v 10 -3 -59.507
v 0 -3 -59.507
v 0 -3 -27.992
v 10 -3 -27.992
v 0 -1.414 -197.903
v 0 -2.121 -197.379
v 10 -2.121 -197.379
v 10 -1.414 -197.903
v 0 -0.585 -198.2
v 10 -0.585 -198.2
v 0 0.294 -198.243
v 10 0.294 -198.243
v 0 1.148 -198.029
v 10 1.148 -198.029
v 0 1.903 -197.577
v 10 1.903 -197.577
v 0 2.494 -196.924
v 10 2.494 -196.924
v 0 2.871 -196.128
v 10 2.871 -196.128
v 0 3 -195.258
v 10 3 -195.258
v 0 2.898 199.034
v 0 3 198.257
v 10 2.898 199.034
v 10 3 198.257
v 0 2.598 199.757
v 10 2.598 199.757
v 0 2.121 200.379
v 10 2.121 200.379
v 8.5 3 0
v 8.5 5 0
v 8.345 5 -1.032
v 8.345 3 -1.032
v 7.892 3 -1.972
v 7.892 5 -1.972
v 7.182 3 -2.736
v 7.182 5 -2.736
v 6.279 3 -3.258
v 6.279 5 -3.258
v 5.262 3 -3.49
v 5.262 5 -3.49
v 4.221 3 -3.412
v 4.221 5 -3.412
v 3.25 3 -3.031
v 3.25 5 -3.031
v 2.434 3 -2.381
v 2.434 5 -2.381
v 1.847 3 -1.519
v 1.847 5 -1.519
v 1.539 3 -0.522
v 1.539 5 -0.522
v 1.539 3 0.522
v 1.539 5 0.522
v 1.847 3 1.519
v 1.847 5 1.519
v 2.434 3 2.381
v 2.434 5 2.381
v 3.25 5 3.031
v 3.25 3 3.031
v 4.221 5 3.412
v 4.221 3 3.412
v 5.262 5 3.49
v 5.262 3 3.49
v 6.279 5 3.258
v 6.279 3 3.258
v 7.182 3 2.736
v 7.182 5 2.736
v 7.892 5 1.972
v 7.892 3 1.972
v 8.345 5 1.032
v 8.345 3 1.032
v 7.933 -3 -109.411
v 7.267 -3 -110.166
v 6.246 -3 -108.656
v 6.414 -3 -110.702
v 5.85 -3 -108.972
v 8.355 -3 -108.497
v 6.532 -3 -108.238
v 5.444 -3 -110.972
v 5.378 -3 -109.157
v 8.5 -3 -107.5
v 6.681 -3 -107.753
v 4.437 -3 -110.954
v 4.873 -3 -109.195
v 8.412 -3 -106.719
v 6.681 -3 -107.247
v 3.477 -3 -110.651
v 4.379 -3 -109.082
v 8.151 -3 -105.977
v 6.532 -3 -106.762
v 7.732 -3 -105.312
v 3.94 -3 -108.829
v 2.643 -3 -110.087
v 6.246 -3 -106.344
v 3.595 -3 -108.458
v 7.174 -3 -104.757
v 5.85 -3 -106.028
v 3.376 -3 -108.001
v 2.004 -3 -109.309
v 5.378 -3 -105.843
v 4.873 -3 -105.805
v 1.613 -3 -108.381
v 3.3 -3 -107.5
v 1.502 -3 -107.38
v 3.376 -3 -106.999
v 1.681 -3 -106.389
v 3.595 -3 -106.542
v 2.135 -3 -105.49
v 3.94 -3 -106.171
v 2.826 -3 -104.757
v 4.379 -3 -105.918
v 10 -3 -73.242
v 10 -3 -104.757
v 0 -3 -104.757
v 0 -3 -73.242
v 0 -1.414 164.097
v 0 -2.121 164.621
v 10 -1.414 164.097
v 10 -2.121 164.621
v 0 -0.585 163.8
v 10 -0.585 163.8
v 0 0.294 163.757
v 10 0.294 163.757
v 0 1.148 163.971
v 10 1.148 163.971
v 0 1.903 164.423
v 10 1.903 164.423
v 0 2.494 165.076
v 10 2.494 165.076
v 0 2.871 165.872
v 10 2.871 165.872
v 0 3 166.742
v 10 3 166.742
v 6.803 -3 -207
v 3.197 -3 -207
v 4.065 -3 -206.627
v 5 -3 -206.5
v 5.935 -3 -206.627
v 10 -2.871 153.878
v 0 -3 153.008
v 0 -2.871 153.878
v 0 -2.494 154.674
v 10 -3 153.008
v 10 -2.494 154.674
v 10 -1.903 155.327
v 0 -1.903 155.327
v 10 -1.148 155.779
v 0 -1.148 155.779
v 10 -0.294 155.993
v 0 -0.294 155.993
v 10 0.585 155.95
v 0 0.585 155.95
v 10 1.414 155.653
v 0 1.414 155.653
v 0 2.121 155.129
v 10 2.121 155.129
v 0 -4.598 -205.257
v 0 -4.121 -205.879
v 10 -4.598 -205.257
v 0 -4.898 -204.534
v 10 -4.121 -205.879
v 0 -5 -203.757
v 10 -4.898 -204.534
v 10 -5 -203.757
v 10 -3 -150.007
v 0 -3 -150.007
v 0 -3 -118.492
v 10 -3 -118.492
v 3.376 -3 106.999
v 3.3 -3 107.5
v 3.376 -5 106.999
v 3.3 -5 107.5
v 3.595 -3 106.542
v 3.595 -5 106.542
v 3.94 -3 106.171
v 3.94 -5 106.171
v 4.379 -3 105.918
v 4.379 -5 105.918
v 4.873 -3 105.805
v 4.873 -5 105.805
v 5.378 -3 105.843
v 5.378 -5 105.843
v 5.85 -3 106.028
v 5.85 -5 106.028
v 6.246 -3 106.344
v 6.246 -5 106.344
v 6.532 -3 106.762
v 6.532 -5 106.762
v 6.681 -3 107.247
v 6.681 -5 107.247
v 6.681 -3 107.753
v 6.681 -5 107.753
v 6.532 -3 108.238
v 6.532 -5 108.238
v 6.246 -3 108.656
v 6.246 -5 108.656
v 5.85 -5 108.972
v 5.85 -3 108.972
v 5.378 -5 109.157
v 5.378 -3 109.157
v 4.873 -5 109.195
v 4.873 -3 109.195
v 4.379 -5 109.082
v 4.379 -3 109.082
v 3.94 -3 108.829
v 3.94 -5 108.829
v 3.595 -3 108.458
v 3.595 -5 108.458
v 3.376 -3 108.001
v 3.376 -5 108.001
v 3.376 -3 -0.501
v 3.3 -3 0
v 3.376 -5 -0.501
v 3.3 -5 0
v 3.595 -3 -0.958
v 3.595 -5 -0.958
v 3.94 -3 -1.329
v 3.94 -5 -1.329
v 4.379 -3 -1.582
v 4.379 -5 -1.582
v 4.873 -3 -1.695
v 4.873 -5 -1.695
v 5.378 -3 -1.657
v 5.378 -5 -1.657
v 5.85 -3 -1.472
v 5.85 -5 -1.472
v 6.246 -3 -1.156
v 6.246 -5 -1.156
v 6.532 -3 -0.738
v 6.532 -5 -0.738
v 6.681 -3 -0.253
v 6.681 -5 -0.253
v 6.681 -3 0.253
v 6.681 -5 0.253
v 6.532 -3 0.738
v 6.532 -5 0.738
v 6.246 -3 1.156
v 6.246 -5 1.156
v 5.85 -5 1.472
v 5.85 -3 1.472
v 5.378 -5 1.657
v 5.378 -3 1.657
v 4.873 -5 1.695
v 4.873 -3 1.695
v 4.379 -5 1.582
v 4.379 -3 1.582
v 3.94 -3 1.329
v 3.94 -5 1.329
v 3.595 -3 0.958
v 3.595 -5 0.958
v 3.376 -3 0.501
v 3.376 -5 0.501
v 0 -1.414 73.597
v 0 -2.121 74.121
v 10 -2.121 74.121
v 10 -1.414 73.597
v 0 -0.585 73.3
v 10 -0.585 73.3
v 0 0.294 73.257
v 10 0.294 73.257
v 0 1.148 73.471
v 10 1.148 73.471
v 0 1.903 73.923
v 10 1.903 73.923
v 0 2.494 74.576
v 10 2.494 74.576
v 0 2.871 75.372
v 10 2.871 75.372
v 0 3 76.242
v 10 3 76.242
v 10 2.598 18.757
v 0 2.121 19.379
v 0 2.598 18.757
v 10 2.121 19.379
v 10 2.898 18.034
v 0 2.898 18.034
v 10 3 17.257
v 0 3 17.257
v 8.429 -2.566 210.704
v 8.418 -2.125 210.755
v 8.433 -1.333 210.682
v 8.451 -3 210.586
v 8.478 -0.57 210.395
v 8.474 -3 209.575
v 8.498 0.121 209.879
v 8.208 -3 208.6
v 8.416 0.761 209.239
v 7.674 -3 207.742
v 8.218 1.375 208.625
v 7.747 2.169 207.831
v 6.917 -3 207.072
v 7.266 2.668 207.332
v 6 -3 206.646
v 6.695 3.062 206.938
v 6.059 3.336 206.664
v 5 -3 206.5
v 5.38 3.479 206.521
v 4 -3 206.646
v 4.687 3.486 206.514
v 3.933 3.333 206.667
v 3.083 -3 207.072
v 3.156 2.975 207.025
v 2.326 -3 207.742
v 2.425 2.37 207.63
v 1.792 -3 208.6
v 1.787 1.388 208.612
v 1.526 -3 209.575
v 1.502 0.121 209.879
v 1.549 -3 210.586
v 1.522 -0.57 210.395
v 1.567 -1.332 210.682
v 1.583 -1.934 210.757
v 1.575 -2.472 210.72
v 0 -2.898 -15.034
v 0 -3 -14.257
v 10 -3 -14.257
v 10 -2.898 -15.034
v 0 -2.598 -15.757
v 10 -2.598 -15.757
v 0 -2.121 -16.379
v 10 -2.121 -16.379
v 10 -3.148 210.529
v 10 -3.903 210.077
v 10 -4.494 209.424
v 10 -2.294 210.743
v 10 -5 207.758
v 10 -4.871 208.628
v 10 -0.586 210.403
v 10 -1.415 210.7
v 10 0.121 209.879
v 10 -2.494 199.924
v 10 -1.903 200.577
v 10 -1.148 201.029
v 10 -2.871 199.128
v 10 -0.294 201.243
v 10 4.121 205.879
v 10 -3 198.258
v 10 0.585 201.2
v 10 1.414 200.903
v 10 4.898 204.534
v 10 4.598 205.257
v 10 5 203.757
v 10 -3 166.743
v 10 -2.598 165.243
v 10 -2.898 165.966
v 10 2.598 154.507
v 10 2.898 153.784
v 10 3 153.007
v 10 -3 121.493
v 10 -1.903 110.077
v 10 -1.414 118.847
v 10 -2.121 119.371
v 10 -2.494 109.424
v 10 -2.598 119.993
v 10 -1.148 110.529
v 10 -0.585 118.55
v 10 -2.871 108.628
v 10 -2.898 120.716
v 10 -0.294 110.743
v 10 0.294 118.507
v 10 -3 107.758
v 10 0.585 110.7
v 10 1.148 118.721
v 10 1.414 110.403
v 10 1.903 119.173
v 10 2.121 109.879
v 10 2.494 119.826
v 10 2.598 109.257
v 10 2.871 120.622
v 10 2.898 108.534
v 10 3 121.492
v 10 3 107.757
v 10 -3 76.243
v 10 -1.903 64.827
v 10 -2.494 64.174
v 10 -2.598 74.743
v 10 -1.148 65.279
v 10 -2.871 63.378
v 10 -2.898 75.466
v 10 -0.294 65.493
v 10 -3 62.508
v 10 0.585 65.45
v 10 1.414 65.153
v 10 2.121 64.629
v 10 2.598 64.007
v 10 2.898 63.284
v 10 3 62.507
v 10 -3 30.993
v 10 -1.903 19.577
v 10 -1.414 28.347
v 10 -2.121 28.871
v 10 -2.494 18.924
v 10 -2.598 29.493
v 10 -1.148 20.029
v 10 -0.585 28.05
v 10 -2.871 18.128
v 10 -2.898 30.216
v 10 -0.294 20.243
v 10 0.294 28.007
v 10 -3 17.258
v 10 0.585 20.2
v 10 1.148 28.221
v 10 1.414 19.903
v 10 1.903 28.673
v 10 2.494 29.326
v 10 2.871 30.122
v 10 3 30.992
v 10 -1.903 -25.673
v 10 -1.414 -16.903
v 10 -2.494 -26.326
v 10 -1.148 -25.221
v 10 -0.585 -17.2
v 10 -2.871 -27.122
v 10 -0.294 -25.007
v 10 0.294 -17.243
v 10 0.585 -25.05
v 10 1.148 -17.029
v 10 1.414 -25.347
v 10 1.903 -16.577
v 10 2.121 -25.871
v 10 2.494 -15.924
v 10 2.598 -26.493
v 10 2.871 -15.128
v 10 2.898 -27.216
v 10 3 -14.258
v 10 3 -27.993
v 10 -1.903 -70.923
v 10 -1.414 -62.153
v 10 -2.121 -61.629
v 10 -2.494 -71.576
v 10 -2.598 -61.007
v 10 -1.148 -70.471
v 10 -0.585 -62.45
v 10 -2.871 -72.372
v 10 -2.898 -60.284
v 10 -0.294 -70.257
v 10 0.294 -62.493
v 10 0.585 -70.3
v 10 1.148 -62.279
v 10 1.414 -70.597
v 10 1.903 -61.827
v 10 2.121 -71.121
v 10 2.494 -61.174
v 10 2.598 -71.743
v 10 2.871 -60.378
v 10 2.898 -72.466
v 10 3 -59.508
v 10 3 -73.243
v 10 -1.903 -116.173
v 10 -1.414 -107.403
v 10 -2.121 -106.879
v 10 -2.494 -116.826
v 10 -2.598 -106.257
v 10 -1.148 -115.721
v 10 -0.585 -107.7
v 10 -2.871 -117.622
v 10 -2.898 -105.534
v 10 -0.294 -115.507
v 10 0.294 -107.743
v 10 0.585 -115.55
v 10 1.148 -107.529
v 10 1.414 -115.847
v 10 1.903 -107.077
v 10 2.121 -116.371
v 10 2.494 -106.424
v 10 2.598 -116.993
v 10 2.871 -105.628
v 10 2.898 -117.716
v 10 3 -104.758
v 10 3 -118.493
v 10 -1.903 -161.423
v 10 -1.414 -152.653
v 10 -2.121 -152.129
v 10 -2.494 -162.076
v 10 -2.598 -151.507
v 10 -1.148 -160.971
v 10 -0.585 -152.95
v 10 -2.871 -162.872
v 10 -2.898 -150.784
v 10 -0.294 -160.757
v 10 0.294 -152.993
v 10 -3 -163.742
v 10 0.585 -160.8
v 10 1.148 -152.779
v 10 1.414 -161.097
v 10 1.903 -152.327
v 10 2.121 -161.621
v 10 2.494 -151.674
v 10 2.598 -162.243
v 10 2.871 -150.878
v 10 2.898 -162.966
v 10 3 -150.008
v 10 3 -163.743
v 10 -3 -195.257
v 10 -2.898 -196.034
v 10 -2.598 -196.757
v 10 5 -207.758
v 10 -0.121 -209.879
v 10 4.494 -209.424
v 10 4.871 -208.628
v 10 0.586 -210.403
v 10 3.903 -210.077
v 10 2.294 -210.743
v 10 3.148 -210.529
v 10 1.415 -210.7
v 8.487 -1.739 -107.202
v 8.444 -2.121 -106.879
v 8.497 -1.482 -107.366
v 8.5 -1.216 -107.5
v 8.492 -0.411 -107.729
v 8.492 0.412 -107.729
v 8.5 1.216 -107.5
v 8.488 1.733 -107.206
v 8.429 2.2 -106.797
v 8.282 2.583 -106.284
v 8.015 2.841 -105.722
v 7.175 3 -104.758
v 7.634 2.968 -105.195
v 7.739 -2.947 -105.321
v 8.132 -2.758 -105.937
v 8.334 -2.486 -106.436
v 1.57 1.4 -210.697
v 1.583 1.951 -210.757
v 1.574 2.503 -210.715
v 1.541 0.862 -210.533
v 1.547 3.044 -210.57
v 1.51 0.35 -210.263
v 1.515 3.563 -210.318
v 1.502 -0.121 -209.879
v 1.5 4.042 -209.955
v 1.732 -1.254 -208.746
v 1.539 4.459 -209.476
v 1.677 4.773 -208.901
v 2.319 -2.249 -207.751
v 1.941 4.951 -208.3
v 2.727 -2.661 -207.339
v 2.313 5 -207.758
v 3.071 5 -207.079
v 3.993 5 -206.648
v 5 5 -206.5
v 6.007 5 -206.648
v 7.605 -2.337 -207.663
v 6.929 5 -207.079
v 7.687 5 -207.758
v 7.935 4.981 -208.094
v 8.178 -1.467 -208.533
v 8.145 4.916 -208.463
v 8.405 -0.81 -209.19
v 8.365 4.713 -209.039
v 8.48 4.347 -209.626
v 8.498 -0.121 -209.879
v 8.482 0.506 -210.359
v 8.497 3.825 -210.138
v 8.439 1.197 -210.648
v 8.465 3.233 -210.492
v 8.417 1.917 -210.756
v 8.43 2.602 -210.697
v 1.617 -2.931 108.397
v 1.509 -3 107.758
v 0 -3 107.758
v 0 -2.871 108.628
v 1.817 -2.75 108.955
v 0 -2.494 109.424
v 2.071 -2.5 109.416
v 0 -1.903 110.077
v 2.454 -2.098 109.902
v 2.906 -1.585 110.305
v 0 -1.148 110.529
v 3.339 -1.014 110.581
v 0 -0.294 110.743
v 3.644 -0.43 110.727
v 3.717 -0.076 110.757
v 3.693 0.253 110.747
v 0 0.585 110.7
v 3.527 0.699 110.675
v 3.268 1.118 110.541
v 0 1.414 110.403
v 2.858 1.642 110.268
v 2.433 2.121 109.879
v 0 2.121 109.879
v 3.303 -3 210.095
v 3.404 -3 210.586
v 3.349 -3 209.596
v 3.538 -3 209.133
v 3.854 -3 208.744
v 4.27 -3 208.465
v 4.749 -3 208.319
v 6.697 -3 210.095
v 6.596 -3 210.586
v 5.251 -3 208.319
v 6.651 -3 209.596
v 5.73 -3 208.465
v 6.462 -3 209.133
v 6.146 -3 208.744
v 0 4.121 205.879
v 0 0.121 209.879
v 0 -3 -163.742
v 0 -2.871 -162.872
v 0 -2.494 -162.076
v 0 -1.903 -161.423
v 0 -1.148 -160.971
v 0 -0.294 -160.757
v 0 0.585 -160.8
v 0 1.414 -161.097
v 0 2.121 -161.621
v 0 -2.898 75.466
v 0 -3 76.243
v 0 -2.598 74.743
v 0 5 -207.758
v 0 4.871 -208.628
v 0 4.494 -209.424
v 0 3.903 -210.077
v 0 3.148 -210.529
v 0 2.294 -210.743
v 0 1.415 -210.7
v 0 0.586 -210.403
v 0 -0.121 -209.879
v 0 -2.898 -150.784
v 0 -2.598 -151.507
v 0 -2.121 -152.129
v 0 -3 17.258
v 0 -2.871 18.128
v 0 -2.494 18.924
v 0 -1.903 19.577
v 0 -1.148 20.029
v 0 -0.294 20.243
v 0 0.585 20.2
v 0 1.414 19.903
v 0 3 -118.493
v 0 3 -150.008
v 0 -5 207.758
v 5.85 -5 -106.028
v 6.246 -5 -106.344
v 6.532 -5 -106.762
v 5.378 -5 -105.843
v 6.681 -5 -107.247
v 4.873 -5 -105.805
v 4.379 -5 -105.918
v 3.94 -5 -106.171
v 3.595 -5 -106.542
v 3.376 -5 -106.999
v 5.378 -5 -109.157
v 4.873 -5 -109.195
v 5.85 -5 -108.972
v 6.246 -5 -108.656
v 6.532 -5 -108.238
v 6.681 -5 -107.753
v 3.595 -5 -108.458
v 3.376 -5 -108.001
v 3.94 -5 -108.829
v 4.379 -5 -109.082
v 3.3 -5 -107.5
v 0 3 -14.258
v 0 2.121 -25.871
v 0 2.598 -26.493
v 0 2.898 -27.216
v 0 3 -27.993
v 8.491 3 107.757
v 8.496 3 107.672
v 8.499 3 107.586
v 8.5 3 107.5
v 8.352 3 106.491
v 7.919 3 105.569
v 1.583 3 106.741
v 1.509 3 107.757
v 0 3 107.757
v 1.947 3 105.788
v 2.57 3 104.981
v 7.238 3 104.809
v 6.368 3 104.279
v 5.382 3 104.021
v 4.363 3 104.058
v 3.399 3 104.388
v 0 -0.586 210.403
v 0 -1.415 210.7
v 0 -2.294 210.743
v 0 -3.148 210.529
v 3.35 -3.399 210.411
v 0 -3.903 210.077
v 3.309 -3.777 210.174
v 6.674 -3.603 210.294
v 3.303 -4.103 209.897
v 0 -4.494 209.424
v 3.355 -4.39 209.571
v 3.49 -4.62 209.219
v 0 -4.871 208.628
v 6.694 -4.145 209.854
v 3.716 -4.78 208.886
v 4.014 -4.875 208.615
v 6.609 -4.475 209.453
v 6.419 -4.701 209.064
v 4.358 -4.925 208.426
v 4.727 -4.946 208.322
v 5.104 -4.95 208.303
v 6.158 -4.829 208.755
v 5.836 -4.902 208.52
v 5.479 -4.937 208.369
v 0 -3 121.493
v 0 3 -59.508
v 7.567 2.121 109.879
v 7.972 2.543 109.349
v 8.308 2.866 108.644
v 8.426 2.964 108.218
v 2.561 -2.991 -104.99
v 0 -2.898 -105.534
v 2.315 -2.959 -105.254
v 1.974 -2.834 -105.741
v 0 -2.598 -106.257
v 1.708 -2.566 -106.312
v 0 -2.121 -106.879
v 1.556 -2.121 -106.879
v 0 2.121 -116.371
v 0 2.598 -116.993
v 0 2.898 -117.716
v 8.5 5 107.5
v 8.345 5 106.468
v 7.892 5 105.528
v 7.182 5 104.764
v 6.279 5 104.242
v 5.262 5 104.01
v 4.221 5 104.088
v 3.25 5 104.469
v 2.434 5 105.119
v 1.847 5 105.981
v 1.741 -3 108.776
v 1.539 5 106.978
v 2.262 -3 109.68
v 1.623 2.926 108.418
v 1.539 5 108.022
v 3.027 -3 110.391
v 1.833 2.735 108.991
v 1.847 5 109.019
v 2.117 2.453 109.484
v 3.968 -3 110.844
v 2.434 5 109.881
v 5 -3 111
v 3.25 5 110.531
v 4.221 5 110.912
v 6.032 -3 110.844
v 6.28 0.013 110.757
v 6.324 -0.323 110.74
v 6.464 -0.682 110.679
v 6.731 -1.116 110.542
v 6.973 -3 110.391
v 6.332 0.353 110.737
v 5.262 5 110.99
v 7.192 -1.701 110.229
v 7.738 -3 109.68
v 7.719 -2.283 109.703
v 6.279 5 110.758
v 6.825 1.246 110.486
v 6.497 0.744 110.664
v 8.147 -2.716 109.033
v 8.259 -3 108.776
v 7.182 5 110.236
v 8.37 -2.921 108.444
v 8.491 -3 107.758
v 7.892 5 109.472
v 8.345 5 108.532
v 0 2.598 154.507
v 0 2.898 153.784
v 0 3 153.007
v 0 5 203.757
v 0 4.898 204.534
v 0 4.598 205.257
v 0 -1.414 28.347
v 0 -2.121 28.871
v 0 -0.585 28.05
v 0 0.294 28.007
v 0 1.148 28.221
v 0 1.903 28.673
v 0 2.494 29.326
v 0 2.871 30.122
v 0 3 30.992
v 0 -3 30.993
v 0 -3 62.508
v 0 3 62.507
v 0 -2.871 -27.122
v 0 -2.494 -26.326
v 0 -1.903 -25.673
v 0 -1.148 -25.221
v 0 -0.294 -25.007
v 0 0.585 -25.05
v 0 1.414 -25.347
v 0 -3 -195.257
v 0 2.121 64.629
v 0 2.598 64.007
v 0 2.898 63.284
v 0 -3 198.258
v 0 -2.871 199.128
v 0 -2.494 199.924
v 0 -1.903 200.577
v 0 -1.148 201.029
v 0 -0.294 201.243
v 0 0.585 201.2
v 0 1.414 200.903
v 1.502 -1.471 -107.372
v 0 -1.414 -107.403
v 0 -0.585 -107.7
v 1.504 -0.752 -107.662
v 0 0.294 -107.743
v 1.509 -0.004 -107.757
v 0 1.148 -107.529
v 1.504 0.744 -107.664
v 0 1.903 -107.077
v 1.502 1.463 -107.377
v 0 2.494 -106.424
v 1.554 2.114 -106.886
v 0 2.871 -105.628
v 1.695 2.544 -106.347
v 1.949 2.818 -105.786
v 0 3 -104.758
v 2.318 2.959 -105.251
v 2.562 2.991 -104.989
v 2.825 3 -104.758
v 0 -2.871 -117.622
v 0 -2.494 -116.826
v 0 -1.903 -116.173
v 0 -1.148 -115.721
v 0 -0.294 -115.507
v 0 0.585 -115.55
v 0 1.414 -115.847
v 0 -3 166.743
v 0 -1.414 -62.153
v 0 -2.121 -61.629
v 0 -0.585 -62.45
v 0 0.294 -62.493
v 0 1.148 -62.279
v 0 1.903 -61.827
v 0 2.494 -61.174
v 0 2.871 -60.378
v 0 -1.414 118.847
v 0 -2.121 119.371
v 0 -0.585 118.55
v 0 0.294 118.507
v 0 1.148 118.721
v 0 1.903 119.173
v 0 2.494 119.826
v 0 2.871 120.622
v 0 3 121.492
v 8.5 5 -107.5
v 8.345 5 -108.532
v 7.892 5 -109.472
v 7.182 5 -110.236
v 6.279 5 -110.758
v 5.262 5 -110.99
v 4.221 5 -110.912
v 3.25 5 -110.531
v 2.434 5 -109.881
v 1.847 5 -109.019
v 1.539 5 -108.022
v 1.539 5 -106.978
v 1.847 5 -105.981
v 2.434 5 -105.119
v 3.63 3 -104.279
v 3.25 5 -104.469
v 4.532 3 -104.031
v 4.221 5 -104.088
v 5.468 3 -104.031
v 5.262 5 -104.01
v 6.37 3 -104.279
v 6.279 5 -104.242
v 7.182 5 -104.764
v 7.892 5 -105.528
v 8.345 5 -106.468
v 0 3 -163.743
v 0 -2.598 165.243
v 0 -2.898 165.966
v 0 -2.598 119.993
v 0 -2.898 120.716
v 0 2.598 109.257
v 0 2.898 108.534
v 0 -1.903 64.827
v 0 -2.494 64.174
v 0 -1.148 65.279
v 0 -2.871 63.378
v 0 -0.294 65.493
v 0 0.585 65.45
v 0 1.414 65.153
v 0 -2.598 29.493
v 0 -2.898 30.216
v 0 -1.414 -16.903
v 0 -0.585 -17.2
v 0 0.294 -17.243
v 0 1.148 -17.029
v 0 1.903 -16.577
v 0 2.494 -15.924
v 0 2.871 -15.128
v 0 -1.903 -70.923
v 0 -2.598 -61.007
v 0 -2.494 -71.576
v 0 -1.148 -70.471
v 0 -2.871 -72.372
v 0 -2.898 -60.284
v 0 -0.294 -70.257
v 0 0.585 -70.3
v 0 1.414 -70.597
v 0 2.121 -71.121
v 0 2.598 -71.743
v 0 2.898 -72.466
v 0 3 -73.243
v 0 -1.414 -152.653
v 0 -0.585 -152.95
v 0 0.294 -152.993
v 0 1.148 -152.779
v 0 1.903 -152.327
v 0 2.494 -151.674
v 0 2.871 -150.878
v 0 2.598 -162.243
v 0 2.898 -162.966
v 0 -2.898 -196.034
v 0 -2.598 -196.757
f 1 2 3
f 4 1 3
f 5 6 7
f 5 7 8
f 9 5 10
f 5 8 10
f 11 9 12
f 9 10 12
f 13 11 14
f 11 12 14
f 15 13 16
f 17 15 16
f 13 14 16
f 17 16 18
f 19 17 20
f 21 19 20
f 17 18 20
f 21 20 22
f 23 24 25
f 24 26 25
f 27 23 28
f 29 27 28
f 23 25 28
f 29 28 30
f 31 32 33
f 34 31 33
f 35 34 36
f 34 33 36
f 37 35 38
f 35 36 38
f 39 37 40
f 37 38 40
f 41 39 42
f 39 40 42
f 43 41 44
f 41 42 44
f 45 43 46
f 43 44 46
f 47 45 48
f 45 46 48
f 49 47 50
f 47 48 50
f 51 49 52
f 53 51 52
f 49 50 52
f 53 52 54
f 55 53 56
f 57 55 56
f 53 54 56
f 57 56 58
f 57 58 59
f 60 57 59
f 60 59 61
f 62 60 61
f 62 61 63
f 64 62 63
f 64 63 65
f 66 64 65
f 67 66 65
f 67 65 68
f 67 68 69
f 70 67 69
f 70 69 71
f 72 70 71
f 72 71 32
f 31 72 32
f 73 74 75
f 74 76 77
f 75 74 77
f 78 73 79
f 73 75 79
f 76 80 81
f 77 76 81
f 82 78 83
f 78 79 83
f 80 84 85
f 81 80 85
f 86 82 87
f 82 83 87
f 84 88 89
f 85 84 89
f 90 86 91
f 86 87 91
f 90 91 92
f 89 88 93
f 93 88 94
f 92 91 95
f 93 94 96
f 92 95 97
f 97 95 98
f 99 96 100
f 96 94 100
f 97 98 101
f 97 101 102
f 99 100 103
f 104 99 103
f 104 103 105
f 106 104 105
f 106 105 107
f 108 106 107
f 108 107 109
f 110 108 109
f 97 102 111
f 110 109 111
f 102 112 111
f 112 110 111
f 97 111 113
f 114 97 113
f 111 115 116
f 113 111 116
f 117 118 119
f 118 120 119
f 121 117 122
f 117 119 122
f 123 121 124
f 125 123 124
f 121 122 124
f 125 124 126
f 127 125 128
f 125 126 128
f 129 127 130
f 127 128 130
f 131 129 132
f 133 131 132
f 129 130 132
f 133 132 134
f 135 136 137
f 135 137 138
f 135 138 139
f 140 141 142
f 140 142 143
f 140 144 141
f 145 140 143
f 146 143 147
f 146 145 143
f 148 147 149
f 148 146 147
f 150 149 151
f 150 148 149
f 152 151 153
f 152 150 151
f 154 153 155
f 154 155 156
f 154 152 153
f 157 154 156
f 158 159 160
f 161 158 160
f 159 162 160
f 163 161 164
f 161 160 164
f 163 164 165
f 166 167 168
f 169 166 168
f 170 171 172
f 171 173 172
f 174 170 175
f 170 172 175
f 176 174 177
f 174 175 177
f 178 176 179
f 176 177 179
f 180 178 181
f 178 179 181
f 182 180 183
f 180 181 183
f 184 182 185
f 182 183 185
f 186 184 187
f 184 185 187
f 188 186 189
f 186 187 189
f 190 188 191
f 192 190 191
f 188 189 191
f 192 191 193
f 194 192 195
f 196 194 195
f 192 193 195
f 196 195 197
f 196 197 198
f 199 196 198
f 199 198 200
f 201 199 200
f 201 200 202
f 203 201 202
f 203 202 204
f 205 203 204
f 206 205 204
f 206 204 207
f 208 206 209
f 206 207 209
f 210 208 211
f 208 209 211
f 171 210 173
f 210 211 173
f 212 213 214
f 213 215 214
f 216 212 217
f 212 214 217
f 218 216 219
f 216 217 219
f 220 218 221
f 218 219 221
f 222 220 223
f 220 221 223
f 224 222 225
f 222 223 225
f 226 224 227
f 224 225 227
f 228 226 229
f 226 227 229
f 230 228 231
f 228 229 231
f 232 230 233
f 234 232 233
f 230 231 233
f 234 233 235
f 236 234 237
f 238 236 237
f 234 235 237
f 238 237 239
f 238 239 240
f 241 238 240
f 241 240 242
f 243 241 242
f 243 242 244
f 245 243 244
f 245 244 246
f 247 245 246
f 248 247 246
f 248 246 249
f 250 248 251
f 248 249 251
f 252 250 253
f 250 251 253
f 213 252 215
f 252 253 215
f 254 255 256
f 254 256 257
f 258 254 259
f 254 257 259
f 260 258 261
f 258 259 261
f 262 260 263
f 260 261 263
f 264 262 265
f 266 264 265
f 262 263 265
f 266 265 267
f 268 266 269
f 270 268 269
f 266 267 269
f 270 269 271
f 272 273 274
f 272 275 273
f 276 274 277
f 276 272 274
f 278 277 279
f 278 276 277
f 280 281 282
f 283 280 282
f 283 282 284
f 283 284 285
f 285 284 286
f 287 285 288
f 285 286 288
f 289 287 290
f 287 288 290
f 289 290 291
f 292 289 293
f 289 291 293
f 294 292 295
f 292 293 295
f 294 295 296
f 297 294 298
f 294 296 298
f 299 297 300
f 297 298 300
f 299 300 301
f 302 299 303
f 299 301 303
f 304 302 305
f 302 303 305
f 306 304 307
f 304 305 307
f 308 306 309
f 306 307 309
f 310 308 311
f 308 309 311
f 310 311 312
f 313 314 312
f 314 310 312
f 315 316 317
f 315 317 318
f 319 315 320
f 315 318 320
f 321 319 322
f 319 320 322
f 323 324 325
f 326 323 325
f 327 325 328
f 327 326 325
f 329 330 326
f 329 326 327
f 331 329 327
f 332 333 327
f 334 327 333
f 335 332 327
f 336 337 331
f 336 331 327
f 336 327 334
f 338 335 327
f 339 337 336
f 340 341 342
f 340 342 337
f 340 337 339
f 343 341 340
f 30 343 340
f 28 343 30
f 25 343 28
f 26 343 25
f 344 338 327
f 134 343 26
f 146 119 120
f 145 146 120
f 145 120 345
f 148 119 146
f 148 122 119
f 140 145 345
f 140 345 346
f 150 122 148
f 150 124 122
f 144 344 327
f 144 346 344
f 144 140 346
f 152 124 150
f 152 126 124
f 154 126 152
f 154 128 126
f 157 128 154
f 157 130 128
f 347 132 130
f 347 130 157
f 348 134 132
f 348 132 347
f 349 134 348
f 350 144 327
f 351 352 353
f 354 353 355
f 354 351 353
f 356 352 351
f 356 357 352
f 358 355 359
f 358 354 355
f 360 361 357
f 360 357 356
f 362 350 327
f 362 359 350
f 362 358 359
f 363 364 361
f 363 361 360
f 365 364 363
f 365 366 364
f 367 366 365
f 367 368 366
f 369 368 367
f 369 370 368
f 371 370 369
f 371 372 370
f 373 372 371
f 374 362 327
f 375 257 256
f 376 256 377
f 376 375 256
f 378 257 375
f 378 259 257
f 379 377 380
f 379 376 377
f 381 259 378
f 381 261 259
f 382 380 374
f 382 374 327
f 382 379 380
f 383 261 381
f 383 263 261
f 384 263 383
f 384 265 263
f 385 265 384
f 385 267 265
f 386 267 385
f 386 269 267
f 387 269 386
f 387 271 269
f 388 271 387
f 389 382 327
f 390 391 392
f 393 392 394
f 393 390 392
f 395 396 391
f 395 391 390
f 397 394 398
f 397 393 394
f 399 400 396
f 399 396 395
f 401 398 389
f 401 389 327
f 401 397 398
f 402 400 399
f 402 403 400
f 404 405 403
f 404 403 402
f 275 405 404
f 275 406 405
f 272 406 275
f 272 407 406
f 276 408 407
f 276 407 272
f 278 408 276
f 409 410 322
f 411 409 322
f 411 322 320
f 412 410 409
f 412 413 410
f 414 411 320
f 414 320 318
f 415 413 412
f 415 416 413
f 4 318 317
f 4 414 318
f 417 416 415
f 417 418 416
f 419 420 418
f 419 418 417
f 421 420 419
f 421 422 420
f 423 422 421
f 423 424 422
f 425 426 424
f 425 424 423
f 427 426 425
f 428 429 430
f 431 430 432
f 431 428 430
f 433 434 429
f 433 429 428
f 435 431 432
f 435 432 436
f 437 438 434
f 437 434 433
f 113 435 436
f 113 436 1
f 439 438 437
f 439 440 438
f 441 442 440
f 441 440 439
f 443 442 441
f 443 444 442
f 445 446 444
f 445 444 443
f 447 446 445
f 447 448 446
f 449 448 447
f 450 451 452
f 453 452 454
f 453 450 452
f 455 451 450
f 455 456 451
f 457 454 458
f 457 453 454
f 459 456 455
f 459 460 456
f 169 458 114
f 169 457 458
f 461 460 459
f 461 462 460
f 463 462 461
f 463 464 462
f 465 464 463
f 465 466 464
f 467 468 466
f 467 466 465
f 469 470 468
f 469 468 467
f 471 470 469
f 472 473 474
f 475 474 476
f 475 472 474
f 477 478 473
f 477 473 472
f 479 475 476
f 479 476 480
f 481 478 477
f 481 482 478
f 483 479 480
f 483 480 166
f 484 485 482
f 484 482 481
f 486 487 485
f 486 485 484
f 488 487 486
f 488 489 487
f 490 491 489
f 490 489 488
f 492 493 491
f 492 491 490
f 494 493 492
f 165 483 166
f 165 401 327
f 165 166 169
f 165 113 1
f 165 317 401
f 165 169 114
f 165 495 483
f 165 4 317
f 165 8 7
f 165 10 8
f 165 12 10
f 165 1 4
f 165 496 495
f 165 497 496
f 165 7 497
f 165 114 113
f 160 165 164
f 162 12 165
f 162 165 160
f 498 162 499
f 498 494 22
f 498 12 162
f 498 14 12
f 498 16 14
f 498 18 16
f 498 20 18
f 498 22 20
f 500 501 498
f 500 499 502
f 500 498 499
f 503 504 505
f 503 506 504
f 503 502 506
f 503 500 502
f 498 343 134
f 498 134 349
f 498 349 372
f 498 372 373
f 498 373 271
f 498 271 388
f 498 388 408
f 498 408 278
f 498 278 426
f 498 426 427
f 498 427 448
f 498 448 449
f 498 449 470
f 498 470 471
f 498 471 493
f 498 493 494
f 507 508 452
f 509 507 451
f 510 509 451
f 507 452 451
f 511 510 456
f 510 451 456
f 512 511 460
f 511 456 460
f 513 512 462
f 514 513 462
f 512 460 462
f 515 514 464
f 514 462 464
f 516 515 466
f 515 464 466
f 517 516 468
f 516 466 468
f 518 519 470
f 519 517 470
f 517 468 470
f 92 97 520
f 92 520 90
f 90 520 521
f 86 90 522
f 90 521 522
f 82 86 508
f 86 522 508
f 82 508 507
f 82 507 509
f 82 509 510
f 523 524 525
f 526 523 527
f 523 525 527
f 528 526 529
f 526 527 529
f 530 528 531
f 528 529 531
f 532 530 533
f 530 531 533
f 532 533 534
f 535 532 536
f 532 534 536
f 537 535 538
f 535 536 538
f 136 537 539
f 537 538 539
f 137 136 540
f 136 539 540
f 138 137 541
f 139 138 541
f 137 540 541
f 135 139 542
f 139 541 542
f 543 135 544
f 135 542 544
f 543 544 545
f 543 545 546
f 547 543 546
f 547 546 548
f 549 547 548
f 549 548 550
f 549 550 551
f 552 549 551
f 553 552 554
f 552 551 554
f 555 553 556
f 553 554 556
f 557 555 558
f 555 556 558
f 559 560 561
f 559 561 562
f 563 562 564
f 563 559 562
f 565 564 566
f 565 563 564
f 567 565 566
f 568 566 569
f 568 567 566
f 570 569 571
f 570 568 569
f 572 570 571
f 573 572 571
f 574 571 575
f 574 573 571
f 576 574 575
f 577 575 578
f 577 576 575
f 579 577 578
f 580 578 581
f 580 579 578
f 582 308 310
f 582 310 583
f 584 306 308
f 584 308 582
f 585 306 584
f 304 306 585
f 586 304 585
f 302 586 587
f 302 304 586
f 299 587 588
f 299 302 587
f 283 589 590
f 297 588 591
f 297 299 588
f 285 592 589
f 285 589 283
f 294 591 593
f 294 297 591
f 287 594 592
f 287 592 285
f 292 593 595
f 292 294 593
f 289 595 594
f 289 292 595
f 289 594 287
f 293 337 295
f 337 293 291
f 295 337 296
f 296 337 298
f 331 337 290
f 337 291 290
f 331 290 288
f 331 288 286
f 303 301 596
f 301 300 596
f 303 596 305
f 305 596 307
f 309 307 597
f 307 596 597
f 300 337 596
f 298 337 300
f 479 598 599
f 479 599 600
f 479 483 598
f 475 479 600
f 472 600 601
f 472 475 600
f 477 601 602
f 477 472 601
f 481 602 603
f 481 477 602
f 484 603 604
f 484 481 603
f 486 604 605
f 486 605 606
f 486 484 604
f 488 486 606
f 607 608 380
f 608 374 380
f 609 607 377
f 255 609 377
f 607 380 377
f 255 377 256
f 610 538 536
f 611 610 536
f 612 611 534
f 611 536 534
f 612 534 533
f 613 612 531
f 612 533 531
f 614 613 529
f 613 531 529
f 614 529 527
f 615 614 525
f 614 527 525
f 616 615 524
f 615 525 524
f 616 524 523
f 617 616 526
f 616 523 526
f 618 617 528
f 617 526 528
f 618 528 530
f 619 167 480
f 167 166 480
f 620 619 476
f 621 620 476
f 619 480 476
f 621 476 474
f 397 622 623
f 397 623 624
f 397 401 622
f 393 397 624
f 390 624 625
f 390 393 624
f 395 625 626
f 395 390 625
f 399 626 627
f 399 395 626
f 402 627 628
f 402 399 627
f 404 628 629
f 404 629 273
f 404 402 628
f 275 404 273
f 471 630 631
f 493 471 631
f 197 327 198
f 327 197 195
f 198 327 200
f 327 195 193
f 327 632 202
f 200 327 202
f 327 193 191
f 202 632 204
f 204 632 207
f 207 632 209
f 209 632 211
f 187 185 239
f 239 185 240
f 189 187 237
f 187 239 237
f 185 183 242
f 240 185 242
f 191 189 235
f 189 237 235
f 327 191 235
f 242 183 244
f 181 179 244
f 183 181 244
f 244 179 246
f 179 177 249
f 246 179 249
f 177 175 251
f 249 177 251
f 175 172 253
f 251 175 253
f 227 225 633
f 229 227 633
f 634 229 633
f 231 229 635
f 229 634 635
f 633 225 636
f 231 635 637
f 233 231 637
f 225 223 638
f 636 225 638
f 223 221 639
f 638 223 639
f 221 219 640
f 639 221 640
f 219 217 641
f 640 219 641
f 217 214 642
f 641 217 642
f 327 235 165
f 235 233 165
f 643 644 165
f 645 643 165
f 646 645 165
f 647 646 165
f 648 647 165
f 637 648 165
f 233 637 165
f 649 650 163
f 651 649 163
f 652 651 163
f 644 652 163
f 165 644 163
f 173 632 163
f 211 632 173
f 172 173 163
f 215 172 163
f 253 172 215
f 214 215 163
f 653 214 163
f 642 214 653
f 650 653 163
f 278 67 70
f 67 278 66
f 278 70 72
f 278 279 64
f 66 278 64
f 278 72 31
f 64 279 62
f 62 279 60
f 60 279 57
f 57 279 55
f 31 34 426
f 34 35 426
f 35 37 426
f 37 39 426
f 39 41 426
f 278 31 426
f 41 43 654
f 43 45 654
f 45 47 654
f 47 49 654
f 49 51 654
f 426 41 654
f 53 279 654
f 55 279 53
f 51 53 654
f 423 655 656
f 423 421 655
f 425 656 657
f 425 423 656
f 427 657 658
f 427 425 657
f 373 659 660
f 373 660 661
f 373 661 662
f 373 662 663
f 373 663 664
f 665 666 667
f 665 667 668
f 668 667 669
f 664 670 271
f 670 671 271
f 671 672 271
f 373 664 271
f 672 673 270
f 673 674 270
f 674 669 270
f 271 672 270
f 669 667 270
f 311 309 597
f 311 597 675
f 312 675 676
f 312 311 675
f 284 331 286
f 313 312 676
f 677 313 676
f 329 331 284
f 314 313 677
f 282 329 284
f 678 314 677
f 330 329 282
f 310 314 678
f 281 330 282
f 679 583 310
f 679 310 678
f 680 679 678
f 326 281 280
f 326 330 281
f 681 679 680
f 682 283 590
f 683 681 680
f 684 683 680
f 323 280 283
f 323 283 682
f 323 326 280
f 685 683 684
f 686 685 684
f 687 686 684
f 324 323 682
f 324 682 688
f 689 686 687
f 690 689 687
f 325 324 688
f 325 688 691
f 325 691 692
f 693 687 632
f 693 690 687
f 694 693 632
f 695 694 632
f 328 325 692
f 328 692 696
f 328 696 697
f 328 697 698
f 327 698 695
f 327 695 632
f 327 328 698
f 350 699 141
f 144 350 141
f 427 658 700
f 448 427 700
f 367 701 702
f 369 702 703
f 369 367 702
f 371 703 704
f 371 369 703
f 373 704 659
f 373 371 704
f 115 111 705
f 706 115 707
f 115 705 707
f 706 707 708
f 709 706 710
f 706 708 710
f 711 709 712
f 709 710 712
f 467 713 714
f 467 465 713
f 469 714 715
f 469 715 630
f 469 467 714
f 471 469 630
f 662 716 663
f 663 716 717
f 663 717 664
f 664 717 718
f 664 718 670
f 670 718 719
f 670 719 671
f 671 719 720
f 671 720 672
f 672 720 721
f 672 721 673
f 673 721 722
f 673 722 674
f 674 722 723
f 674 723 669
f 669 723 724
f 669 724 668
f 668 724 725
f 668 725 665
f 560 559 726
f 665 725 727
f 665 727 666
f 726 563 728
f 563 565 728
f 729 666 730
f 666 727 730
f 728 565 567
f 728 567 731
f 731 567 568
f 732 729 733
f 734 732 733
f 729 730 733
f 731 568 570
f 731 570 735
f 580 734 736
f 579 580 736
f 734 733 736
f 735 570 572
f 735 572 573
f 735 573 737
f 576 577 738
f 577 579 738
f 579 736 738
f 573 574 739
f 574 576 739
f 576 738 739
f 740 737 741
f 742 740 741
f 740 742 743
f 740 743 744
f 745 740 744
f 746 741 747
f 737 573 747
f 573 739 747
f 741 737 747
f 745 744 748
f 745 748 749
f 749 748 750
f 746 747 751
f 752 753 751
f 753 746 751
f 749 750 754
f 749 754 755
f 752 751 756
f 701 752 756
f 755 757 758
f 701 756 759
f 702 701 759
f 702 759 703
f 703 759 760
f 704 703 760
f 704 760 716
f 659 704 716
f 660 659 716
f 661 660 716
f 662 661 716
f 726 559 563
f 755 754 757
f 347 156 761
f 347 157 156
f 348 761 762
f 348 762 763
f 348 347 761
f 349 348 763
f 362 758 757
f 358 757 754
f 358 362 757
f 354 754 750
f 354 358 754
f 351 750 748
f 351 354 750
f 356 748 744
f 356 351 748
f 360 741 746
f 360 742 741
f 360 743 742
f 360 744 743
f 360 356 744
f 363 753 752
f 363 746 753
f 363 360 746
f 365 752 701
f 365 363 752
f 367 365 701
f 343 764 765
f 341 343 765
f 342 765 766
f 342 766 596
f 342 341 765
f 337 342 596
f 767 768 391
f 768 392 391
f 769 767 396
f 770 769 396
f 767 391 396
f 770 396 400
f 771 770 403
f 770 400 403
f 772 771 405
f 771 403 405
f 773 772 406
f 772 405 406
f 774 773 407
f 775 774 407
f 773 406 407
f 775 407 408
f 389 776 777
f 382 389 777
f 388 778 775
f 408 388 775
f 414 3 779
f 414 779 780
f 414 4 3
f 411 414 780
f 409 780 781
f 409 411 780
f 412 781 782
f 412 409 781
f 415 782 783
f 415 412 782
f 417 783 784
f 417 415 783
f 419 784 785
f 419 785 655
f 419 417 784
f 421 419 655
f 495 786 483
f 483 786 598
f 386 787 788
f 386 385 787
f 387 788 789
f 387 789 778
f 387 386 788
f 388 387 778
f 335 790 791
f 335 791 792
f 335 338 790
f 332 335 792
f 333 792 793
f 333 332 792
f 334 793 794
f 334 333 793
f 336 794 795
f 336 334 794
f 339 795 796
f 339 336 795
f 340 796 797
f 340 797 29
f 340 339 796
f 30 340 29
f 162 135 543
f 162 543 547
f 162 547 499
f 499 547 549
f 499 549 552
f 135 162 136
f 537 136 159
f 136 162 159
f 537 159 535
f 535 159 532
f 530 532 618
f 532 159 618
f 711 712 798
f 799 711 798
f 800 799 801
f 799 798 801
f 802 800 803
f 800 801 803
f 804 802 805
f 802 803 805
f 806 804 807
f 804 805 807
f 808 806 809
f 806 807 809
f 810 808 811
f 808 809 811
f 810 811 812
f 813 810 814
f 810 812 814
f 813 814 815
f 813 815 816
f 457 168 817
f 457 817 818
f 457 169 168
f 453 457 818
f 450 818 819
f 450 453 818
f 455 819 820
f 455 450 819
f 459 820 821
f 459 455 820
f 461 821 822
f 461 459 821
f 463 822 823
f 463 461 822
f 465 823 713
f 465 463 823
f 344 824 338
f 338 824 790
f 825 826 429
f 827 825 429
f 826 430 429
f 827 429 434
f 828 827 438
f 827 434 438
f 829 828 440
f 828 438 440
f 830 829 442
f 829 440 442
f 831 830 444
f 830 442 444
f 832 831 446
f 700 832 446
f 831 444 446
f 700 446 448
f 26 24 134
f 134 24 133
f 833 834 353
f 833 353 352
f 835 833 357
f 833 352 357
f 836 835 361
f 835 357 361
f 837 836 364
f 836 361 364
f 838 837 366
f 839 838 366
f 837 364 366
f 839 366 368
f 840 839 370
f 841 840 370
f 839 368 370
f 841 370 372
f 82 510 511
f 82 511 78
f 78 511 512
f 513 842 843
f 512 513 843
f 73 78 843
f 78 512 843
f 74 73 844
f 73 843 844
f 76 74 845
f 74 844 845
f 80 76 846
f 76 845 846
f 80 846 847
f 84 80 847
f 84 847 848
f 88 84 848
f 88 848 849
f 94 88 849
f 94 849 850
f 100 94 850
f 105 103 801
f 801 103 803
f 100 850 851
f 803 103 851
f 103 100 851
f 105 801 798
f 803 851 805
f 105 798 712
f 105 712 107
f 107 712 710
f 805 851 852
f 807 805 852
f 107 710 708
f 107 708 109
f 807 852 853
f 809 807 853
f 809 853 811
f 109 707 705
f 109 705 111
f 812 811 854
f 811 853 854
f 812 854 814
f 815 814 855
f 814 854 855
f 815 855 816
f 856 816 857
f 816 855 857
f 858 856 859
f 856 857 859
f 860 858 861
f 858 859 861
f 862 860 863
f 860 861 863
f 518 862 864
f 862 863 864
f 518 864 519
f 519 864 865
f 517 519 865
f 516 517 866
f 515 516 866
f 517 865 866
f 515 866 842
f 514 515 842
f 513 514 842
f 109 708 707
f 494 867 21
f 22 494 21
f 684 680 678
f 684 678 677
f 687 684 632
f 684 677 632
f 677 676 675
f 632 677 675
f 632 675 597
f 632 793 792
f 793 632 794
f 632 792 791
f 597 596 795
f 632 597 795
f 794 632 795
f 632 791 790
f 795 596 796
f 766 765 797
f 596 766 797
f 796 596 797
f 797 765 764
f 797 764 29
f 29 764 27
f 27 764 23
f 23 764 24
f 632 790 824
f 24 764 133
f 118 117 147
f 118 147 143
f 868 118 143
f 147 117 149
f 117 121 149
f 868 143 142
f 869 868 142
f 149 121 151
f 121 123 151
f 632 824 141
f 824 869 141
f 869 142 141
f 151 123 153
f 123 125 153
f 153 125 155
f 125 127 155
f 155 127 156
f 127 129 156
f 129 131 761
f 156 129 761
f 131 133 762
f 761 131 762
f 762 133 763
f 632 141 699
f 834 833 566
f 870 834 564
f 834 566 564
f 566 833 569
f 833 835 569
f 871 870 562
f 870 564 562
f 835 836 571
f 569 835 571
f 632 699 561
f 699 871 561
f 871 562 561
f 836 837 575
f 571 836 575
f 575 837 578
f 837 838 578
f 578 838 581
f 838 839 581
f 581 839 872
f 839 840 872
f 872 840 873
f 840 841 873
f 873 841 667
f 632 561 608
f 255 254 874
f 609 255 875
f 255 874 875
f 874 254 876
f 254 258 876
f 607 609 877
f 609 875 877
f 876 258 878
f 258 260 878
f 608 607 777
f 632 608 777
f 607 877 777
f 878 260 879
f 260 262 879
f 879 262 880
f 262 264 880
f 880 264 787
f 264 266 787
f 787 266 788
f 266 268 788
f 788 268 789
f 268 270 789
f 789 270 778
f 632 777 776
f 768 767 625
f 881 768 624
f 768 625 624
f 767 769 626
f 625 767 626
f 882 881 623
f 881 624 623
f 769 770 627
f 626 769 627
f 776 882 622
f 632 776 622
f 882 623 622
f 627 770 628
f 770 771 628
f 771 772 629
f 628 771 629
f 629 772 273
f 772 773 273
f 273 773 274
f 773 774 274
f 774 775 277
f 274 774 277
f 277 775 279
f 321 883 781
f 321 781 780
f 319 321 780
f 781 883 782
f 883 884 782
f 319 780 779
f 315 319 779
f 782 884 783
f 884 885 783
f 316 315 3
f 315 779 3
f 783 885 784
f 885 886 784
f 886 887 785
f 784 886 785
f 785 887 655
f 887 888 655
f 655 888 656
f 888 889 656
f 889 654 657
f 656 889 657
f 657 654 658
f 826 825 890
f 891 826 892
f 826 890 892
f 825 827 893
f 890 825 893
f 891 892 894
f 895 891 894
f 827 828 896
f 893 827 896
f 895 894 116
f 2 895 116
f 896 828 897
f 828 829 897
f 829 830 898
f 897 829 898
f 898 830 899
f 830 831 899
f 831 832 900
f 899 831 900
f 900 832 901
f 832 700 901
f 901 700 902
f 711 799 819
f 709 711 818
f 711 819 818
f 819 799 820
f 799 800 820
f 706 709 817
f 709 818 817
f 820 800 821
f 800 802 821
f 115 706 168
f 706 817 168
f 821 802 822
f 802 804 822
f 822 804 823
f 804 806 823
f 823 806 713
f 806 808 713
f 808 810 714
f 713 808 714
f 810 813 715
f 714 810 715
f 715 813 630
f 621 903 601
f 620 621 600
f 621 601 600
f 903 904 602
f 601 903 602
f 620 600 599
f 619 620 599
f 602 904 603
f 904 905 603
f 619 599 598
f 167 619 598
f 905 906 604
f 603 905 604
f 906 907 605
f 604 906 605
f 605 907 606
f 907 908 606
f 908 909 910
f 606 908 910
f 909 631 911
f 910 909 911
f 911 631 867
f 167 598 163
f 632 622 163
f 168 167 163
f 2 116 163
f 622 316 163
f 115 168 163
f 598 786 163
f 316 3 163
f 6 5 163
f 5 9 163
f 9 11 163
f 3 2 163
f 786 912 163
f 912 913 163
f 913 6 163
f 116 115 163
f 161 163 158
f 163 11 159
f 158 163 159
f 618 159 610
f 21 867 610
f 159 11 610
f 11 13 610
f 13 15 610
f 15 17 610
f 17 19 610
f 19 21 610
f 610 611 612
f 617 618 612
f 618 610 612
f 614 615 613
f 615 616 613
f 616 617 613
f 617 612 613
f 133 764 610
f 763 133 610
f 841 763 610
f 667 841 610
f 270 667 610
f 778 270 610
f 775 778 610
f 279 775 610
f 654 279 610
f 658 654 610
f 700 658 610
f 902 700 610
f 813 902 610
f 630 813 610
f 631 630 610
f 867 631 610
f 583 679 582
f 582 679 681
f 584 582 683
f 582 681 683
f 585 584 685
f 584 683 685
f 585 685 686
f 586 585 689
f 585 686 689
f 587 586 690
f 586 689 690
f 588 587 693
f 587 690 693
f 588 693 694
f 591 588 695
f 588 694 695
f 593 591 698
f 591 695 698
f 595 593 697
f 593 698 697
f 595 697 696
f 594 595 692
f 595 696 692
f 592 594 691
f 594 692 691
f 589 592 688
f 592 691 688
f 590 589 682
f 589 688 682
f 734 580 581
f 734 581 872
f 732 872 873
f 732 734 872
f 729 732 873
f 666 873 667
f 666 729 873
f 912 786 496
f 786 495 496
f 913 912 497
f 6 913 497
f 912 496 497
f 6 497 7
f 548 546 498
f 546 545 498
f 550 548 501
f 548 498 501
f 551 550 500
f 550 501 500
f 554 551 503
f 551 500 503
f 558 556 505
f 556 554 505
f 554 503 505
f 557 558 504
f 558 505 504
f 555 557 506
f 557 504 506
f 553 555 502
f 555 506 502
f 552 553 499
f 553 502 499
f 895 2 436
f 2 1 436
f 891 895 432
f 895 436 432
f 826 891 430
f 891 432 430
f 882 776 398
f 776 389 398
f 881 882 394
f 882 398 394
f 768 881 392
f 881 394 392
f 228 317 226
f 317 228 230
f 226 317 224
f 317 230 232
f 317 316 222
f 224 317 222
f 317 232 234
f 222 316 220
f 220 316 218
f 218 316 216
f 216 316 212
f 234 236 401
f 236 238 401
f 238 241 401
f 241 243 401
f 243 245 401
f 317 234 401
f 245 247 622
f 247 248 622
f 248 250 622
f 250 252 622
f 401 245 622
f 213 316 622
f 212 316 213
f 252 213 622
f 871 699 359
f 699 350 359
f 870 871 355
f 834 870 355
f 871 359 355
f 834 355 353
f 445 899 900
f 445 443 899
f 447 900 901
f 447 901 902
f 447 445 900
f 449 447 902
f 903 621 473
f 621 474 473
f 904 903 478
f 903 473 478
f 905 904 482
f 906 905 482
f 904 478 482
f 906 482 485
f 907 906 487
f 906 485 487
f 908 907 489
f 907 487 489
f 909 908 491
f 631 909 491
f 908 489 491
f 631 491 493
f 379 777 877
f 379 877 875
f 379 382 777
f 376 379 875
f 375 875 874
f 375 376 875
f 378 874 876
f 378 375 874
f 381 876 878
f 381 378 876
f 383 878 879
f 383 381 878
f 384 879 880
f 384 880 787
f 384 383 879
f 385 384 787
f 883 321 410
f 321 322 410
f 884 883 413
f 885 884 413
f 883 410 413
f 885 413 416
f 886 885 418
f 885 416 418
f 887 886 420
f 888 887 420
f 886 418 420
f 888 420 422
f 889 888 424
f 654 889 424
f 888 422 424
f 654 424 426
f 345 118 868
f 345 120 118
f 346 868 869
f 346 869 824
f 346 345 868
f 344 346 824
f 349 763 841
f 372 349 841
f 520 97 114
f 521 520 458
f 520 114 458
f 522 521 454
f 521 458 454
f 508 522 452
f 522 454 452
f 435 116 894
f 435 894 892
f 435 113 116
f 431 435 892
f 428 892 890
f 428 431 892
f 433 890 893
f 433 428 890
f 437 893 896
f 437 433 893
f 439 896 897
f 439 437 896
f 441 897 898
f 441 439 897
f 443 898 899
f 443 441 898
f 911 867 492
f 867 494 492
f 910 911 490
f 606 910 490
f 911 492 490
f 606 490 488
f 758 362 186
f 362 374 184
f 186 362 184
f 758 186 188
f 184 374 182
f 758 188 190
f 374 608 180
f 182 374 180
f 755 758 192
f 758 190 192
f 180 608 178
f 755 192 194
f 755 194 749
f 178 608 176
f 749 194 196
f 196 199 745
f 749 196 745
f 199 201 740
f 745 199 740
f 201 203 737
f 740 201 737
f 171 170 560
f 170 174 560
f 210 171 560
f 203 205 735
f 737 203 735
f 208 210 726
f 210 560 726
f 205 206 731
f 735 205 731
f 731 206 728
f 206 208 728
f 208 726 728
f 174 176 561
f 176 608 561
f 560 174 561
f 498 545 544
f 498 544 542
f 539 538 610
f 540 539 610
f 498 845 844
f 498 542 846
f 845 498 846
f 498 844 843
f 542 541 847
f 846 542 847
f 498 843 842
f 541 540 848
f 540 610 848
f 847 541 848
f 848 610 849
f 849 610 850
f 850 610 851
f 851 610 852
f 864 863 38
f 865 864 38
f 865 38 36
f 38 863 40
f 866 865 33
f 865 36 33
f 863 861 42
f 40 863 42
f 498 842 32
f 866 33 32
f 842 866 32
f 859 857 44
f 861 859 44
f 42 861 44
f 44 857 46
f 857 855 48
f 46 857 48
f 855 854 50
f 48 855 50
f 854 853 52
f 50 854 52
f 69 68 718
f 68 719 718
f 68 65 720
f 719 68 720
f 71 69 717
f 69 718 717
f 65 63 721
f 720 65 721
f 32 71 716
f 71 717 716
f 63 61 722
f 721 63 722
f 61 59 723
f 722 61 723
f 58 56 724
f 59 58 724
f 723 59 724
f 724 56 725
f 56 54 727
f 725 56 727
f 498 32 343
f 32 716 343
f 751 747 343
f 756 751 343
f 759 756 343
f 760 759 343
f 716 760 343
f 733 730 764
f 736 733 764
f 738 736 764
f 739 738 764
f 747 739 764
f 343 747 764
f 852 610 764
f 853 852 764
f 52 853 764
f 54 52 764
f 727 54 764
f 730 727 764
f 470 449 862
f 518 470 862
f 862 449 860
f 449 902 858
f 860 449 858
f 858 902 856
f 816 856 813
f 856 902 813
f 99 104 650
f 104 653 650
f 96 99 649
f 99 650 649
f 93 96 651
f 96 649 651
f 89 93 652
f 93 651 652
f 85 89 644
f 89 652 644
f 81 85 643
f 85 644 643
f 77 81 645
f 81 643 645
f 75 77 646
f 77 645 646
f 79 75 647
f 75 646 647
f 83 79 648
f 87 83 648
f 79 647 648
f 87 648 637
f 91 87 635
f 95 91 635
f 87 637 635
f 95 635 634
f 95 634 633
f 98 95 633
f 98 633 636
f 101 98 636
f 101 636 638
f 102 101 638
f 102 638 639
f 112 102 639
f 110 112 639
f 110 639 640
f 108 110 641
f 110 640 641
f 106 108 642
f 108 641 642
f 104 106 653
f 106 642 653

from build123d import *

# Parameters (mm, degrees)
BOSS_EXTRUDE1_DEPTH                          = 10
FILLET1_R                                    = 3
CBORE_FOR_M3_HEX_HEAD_CAP_SCREW1_D           = 3.4
CBORE_FOR_M3_HEX_HEAD_CAP_SCREW1_CBORE_D     = 7
CBORE_FOR_M3_HEX_HEAD_CAP_SCREW1_CBORE_DEPTH = 8


with BuildPart() as part:
    # Sketch1 → Boss-Extrude1 (new body)
    with BuildSketch(Plane(origin=(0, 0, 0), x_dir=(0, 0, -1), z_dir=(1, 0, 0))):
        Polygon((215, 5), (-205, 5), (-215, -5), (205, -5), align=None)
        Polygon((-165.5, -3), (-205.5, -3), (-199.5, 3), (-159.5, 3), align=None, mode=Mode.SUBTRACT)
        Polygon((-160.25, -3), (-154.25, 3), (-114.25, 3), (-120.25, -3), align=None, mode=Mode.SUBTRACT)
        Polygon((-115, -3), (-109, 3), (-69, 3), (-75, -3), align=None, mode=Mode.SUBTRACT)
        Polygon((-69.75, -3), (-63.75, 3), (-23.75, 3), (-29.75, -3), align=None, mode=Mode.SUBTRACT)
        Polygon((-24.5, -3), (-18.5, 3), (21.5, 3), (15.5, -3), align=None, mode=Mode.SUBTRACT)
        Polygon((20.75, -3), (26.75, 3), (66.75, 3), (60.75, -3), align=None, mode=Mode.SUBTRACT)
        Polygon((66, -3), (72, 3), (112, 3), (106, -3), align=None, mode=Mode.SUBTRACT)
        Polygon((111.25, -3), (117.25, 3), (157.25, 3), (151.25, -3), align=None, mode=Mode.SUBTRACT)
        Polygon((156.5, -3), (162.5, 3), (202.5, 3), (196.5, -3), align=None, mode=Mode.SUBTRACT)
    extrude(amount=BOSS_EXTRUDE1_DEPTH)

    # Fillet1
    fillet1_edges = [part.edges().sort_by_distance(p)[0] for p in [
        (5, -5, 215),
        (5, 5, 205),
        (5, -5, -205),
        (5, 5, -215),
        (5, -3, -156.5),
        (5, -3, -151.25),
        (5, 3, -162.5),
        (5, 3, -157.25),
        (5, -3, -106),
        (5, -3, -111.25),
        (5, 3, -112),
        (5, 3, -117.25),
        (5, -3, -66),
        (5, -3, -60.75),
        (5, 3, -72),
        (5, 3, -66.75),
        (5, -3, -15.5),
        (5, -3, -20.75),
        (5, 3, -21.5),
        (5, 3, -26.75),
        (5, -3, 24.5),
        (5, -3, 29.75),
        (5, 3, 18.5),
        (5, 3, 23.75),
        (5, -3, 75),
        (5, -3, 69.75),
        (5, 3, 69),
        (5, 3, 63.75),
        (5, -3, 115),
        (5, -3, 120.25),
        (5, 3, 109),
        (5, 3, 114.25),
        (5, -3, 160.25),
        (5, 3, 159.5),
        (5, 3, 154.25),
        (5, -3, 205.5),
        (5, 3, 199.5),
        (5, -3, -196.5),
        (5, 3, -202.5),
        (5, -3, 165.5),
    ]]
    fillet(fillet1_edges, radius=FILLET1_R - 0.0001)  # a hair under: the kernel refuses the full size

    # CBORE for M3 Hex Head Cap Screw1 (through all)
    with Locations(Plane(origin=(0, 5, 0), x_dir=(1, 0, 0), z_dir=(0, 1, 0))):
        with Locations((5, -210), (5, 0), (5, -107.5), (5, 107.5), (5, 210)):
            CounterBoreHole(CBORE_FOR_M3_HEX_HEAD_CAP_SCREW1_D / 2, CBORE_FOR_M3_HEX_HEAD_CAP_SCREW1_CBORE_D / 2, CBORE_FOR_M3_HEX_HEAD_CAP_SCREW1_CBORE_DEPTH)


solid = part.part
